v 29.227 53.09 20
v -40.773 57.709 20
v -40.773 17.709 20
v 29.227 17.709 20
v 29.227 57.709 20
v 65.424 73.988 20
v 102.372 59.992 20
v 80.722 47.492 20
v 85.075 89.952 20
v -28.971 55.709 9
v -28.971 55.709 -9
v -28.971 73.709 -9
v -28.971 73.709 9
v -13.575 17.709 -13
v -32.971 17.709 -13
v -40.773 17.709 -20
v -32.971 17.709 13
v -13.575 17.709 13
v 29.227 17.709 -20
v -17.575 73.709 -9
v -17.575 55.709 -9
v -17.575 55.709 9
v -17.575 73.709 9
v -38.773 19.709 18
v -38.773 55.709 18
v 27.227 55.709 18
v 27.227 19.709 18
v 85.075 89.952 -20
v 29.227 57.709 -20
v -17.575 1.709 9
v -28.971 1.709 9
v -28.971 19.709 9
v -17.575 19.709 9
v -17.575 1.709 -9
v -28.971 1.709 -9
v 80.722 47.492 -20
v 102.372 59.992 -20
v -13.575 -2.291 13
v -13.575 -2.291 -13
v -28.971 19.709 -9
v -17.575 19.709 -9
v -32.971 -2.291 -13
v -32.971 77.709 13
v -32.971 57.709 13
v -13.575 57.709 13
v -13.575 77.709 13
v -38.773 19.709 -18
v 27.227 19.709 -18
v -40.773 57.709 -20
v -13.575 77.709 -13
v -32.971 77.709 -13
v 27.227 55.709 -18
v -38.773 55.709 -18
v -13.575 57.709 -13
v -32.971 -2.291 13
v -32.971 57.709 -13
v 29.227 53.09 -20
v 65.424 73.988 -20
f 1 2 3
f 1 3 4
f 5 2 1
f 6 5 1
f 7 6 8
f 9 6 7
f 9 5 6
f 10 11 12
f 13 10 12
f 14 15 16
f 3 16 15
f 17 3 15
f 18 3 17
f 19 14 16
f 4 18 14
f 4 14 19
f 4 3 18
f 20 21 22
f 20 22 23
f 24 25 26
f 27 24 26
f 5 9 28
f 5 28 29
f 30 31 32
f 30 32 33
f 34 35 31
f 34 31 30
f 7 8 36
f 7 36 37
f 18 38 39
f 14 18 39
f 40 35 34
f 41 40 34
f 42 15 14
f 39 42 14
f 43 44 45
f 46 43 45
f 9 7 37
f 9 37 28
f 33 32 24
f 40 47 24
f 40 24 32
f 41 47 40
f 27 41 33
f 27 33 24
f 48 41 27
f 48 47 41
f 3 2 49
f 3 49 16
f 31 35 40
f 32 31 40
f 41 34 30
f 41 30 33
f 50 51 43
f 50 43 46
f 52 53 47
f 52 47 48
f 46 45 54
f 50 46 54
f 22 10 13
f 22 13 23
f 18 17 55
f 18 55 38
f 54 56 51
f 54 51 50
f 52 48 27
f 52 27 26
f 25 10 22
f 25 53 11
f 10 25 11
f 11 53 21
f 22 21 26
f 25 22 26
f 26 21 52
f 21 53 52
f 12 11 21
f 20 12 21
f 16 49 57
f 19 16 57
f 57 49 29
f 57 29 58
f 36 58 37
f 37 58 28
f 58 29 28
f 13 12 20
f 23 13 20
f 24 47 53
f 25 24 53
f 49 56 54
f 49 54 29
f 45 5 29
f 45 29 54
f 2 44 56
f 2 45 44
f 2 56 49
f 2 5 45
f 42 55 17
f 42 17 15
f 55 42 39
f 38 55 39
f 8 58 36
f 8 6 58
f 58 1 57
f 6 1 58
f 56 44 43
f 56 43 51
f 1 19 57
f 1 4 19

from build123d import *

# Parameters (mm, degrees)
SALIENTE_EXTRUIR1_DEPTH      = 20
SALIENTE_EXTRUIR2_DEPTH      = 20
SALIENTE_EXTRUIR2_DEPTH_BACK = 60
CROQUIS2_W                   = 19.396492872
CROQUIS2_H                   = 26
CORTAR_EXTRUIR1_DEPTH        = 18
CORTAR_EXTRUIR1_DEPTH_BACK   = 18
CORTAR_EXTRUIR1_START        = -20
CROQUIS4_W                   = 66
CROQUIS4_H                   = 36
CORTAR_EXTRUIR2_DEPTH        = 9
CORTAR_EXTRUIR2_DEPTH_BACK   = 9
CORTAR_EXTRUIR2_START        = -13
CROQUIS6_W                   = 11.396492872
CROQUIS6_H                   = 72


with BuildPart() as part:
    # Croquis1 → Saliente-Extruir1 (new, symmetric)
    with BuildSketch(Plane.XY):
        Polygon((65.424276511, 73.988341167), (80.72172581, 47.492381754), (102.372360904, 59.992381754), (85.074911605, 89.952442782), (29.226887967, 57.7085713), (-40.773112033, 57.7085713), (-40.773112033, 17.7085713), (29.226887967, 17.7085713), (29.226887967, 53.089769147), align=None)
    extrude(amount=SALIENTE_EXTRUIR1_DEPTH, both=True)

    # Croquis2 → Saliente-Extruir2 (add, two sides: drawn at the far end of the back side and taken through both)
    with BuildSketch(Plane(origin=(0, 57.7085713, 0), x_dir=(1, 0, 0), z_dir=(0, 1, 0)).offset(-SALIENTE_EXTRUIR2_DEPTH_BACK)):
        with Locations((-23.273112033, 0)):
            Rectangle(CROQUIS2_W, CROQUIS2_H)
    extrude(amount=SALIENTE_EXTRUIR2_DEPTH + SALIENTE_EXTRUIR2_DEPTH_BACK)

    # Croquis4 → Cortar-Extruir1 (cut, two sides: drawn at the far end of the back side and taken through both)
    with BuildSketch(Plane.XY.offset(20).offset(CORTAR_EXTRUIR1_START - CORTAR_EXTRUIR1_DEPTH_BACK)):
        with Locations((-5.773112033, 37.7085713)):
            Rectangle(CROQUIS4_W, CROQUIS4_H)
    extrude(amount=CORTAR_EXTRUIR1_DEPTH + CORTAR_EXTRUIR1_DEPTH_BACK, mode=Mode.SUBTRACT)

    # Croquis6 → Cortar-Extruir2 (cut, two sides: drawn at the far end of the back side and taken through both)
    with BuildSketch(Plane.XY.offset(13).offset(CORTAR_EXTRUIR2_START - CORTAR_EXTRUIR2_DEPTH_BACK)):
        with Locations((-23.273112033, 37.7085713)):
            Rectangle(CROQUIS6_W, CROQUIS6_H)
    extrude(amount=CORTAR_EXTRUIR2_DEPTH + CORTAR_EXTRUIR2_DEPTH_BACK, mode=Mode.SUBTRACT)


solid = part.part
